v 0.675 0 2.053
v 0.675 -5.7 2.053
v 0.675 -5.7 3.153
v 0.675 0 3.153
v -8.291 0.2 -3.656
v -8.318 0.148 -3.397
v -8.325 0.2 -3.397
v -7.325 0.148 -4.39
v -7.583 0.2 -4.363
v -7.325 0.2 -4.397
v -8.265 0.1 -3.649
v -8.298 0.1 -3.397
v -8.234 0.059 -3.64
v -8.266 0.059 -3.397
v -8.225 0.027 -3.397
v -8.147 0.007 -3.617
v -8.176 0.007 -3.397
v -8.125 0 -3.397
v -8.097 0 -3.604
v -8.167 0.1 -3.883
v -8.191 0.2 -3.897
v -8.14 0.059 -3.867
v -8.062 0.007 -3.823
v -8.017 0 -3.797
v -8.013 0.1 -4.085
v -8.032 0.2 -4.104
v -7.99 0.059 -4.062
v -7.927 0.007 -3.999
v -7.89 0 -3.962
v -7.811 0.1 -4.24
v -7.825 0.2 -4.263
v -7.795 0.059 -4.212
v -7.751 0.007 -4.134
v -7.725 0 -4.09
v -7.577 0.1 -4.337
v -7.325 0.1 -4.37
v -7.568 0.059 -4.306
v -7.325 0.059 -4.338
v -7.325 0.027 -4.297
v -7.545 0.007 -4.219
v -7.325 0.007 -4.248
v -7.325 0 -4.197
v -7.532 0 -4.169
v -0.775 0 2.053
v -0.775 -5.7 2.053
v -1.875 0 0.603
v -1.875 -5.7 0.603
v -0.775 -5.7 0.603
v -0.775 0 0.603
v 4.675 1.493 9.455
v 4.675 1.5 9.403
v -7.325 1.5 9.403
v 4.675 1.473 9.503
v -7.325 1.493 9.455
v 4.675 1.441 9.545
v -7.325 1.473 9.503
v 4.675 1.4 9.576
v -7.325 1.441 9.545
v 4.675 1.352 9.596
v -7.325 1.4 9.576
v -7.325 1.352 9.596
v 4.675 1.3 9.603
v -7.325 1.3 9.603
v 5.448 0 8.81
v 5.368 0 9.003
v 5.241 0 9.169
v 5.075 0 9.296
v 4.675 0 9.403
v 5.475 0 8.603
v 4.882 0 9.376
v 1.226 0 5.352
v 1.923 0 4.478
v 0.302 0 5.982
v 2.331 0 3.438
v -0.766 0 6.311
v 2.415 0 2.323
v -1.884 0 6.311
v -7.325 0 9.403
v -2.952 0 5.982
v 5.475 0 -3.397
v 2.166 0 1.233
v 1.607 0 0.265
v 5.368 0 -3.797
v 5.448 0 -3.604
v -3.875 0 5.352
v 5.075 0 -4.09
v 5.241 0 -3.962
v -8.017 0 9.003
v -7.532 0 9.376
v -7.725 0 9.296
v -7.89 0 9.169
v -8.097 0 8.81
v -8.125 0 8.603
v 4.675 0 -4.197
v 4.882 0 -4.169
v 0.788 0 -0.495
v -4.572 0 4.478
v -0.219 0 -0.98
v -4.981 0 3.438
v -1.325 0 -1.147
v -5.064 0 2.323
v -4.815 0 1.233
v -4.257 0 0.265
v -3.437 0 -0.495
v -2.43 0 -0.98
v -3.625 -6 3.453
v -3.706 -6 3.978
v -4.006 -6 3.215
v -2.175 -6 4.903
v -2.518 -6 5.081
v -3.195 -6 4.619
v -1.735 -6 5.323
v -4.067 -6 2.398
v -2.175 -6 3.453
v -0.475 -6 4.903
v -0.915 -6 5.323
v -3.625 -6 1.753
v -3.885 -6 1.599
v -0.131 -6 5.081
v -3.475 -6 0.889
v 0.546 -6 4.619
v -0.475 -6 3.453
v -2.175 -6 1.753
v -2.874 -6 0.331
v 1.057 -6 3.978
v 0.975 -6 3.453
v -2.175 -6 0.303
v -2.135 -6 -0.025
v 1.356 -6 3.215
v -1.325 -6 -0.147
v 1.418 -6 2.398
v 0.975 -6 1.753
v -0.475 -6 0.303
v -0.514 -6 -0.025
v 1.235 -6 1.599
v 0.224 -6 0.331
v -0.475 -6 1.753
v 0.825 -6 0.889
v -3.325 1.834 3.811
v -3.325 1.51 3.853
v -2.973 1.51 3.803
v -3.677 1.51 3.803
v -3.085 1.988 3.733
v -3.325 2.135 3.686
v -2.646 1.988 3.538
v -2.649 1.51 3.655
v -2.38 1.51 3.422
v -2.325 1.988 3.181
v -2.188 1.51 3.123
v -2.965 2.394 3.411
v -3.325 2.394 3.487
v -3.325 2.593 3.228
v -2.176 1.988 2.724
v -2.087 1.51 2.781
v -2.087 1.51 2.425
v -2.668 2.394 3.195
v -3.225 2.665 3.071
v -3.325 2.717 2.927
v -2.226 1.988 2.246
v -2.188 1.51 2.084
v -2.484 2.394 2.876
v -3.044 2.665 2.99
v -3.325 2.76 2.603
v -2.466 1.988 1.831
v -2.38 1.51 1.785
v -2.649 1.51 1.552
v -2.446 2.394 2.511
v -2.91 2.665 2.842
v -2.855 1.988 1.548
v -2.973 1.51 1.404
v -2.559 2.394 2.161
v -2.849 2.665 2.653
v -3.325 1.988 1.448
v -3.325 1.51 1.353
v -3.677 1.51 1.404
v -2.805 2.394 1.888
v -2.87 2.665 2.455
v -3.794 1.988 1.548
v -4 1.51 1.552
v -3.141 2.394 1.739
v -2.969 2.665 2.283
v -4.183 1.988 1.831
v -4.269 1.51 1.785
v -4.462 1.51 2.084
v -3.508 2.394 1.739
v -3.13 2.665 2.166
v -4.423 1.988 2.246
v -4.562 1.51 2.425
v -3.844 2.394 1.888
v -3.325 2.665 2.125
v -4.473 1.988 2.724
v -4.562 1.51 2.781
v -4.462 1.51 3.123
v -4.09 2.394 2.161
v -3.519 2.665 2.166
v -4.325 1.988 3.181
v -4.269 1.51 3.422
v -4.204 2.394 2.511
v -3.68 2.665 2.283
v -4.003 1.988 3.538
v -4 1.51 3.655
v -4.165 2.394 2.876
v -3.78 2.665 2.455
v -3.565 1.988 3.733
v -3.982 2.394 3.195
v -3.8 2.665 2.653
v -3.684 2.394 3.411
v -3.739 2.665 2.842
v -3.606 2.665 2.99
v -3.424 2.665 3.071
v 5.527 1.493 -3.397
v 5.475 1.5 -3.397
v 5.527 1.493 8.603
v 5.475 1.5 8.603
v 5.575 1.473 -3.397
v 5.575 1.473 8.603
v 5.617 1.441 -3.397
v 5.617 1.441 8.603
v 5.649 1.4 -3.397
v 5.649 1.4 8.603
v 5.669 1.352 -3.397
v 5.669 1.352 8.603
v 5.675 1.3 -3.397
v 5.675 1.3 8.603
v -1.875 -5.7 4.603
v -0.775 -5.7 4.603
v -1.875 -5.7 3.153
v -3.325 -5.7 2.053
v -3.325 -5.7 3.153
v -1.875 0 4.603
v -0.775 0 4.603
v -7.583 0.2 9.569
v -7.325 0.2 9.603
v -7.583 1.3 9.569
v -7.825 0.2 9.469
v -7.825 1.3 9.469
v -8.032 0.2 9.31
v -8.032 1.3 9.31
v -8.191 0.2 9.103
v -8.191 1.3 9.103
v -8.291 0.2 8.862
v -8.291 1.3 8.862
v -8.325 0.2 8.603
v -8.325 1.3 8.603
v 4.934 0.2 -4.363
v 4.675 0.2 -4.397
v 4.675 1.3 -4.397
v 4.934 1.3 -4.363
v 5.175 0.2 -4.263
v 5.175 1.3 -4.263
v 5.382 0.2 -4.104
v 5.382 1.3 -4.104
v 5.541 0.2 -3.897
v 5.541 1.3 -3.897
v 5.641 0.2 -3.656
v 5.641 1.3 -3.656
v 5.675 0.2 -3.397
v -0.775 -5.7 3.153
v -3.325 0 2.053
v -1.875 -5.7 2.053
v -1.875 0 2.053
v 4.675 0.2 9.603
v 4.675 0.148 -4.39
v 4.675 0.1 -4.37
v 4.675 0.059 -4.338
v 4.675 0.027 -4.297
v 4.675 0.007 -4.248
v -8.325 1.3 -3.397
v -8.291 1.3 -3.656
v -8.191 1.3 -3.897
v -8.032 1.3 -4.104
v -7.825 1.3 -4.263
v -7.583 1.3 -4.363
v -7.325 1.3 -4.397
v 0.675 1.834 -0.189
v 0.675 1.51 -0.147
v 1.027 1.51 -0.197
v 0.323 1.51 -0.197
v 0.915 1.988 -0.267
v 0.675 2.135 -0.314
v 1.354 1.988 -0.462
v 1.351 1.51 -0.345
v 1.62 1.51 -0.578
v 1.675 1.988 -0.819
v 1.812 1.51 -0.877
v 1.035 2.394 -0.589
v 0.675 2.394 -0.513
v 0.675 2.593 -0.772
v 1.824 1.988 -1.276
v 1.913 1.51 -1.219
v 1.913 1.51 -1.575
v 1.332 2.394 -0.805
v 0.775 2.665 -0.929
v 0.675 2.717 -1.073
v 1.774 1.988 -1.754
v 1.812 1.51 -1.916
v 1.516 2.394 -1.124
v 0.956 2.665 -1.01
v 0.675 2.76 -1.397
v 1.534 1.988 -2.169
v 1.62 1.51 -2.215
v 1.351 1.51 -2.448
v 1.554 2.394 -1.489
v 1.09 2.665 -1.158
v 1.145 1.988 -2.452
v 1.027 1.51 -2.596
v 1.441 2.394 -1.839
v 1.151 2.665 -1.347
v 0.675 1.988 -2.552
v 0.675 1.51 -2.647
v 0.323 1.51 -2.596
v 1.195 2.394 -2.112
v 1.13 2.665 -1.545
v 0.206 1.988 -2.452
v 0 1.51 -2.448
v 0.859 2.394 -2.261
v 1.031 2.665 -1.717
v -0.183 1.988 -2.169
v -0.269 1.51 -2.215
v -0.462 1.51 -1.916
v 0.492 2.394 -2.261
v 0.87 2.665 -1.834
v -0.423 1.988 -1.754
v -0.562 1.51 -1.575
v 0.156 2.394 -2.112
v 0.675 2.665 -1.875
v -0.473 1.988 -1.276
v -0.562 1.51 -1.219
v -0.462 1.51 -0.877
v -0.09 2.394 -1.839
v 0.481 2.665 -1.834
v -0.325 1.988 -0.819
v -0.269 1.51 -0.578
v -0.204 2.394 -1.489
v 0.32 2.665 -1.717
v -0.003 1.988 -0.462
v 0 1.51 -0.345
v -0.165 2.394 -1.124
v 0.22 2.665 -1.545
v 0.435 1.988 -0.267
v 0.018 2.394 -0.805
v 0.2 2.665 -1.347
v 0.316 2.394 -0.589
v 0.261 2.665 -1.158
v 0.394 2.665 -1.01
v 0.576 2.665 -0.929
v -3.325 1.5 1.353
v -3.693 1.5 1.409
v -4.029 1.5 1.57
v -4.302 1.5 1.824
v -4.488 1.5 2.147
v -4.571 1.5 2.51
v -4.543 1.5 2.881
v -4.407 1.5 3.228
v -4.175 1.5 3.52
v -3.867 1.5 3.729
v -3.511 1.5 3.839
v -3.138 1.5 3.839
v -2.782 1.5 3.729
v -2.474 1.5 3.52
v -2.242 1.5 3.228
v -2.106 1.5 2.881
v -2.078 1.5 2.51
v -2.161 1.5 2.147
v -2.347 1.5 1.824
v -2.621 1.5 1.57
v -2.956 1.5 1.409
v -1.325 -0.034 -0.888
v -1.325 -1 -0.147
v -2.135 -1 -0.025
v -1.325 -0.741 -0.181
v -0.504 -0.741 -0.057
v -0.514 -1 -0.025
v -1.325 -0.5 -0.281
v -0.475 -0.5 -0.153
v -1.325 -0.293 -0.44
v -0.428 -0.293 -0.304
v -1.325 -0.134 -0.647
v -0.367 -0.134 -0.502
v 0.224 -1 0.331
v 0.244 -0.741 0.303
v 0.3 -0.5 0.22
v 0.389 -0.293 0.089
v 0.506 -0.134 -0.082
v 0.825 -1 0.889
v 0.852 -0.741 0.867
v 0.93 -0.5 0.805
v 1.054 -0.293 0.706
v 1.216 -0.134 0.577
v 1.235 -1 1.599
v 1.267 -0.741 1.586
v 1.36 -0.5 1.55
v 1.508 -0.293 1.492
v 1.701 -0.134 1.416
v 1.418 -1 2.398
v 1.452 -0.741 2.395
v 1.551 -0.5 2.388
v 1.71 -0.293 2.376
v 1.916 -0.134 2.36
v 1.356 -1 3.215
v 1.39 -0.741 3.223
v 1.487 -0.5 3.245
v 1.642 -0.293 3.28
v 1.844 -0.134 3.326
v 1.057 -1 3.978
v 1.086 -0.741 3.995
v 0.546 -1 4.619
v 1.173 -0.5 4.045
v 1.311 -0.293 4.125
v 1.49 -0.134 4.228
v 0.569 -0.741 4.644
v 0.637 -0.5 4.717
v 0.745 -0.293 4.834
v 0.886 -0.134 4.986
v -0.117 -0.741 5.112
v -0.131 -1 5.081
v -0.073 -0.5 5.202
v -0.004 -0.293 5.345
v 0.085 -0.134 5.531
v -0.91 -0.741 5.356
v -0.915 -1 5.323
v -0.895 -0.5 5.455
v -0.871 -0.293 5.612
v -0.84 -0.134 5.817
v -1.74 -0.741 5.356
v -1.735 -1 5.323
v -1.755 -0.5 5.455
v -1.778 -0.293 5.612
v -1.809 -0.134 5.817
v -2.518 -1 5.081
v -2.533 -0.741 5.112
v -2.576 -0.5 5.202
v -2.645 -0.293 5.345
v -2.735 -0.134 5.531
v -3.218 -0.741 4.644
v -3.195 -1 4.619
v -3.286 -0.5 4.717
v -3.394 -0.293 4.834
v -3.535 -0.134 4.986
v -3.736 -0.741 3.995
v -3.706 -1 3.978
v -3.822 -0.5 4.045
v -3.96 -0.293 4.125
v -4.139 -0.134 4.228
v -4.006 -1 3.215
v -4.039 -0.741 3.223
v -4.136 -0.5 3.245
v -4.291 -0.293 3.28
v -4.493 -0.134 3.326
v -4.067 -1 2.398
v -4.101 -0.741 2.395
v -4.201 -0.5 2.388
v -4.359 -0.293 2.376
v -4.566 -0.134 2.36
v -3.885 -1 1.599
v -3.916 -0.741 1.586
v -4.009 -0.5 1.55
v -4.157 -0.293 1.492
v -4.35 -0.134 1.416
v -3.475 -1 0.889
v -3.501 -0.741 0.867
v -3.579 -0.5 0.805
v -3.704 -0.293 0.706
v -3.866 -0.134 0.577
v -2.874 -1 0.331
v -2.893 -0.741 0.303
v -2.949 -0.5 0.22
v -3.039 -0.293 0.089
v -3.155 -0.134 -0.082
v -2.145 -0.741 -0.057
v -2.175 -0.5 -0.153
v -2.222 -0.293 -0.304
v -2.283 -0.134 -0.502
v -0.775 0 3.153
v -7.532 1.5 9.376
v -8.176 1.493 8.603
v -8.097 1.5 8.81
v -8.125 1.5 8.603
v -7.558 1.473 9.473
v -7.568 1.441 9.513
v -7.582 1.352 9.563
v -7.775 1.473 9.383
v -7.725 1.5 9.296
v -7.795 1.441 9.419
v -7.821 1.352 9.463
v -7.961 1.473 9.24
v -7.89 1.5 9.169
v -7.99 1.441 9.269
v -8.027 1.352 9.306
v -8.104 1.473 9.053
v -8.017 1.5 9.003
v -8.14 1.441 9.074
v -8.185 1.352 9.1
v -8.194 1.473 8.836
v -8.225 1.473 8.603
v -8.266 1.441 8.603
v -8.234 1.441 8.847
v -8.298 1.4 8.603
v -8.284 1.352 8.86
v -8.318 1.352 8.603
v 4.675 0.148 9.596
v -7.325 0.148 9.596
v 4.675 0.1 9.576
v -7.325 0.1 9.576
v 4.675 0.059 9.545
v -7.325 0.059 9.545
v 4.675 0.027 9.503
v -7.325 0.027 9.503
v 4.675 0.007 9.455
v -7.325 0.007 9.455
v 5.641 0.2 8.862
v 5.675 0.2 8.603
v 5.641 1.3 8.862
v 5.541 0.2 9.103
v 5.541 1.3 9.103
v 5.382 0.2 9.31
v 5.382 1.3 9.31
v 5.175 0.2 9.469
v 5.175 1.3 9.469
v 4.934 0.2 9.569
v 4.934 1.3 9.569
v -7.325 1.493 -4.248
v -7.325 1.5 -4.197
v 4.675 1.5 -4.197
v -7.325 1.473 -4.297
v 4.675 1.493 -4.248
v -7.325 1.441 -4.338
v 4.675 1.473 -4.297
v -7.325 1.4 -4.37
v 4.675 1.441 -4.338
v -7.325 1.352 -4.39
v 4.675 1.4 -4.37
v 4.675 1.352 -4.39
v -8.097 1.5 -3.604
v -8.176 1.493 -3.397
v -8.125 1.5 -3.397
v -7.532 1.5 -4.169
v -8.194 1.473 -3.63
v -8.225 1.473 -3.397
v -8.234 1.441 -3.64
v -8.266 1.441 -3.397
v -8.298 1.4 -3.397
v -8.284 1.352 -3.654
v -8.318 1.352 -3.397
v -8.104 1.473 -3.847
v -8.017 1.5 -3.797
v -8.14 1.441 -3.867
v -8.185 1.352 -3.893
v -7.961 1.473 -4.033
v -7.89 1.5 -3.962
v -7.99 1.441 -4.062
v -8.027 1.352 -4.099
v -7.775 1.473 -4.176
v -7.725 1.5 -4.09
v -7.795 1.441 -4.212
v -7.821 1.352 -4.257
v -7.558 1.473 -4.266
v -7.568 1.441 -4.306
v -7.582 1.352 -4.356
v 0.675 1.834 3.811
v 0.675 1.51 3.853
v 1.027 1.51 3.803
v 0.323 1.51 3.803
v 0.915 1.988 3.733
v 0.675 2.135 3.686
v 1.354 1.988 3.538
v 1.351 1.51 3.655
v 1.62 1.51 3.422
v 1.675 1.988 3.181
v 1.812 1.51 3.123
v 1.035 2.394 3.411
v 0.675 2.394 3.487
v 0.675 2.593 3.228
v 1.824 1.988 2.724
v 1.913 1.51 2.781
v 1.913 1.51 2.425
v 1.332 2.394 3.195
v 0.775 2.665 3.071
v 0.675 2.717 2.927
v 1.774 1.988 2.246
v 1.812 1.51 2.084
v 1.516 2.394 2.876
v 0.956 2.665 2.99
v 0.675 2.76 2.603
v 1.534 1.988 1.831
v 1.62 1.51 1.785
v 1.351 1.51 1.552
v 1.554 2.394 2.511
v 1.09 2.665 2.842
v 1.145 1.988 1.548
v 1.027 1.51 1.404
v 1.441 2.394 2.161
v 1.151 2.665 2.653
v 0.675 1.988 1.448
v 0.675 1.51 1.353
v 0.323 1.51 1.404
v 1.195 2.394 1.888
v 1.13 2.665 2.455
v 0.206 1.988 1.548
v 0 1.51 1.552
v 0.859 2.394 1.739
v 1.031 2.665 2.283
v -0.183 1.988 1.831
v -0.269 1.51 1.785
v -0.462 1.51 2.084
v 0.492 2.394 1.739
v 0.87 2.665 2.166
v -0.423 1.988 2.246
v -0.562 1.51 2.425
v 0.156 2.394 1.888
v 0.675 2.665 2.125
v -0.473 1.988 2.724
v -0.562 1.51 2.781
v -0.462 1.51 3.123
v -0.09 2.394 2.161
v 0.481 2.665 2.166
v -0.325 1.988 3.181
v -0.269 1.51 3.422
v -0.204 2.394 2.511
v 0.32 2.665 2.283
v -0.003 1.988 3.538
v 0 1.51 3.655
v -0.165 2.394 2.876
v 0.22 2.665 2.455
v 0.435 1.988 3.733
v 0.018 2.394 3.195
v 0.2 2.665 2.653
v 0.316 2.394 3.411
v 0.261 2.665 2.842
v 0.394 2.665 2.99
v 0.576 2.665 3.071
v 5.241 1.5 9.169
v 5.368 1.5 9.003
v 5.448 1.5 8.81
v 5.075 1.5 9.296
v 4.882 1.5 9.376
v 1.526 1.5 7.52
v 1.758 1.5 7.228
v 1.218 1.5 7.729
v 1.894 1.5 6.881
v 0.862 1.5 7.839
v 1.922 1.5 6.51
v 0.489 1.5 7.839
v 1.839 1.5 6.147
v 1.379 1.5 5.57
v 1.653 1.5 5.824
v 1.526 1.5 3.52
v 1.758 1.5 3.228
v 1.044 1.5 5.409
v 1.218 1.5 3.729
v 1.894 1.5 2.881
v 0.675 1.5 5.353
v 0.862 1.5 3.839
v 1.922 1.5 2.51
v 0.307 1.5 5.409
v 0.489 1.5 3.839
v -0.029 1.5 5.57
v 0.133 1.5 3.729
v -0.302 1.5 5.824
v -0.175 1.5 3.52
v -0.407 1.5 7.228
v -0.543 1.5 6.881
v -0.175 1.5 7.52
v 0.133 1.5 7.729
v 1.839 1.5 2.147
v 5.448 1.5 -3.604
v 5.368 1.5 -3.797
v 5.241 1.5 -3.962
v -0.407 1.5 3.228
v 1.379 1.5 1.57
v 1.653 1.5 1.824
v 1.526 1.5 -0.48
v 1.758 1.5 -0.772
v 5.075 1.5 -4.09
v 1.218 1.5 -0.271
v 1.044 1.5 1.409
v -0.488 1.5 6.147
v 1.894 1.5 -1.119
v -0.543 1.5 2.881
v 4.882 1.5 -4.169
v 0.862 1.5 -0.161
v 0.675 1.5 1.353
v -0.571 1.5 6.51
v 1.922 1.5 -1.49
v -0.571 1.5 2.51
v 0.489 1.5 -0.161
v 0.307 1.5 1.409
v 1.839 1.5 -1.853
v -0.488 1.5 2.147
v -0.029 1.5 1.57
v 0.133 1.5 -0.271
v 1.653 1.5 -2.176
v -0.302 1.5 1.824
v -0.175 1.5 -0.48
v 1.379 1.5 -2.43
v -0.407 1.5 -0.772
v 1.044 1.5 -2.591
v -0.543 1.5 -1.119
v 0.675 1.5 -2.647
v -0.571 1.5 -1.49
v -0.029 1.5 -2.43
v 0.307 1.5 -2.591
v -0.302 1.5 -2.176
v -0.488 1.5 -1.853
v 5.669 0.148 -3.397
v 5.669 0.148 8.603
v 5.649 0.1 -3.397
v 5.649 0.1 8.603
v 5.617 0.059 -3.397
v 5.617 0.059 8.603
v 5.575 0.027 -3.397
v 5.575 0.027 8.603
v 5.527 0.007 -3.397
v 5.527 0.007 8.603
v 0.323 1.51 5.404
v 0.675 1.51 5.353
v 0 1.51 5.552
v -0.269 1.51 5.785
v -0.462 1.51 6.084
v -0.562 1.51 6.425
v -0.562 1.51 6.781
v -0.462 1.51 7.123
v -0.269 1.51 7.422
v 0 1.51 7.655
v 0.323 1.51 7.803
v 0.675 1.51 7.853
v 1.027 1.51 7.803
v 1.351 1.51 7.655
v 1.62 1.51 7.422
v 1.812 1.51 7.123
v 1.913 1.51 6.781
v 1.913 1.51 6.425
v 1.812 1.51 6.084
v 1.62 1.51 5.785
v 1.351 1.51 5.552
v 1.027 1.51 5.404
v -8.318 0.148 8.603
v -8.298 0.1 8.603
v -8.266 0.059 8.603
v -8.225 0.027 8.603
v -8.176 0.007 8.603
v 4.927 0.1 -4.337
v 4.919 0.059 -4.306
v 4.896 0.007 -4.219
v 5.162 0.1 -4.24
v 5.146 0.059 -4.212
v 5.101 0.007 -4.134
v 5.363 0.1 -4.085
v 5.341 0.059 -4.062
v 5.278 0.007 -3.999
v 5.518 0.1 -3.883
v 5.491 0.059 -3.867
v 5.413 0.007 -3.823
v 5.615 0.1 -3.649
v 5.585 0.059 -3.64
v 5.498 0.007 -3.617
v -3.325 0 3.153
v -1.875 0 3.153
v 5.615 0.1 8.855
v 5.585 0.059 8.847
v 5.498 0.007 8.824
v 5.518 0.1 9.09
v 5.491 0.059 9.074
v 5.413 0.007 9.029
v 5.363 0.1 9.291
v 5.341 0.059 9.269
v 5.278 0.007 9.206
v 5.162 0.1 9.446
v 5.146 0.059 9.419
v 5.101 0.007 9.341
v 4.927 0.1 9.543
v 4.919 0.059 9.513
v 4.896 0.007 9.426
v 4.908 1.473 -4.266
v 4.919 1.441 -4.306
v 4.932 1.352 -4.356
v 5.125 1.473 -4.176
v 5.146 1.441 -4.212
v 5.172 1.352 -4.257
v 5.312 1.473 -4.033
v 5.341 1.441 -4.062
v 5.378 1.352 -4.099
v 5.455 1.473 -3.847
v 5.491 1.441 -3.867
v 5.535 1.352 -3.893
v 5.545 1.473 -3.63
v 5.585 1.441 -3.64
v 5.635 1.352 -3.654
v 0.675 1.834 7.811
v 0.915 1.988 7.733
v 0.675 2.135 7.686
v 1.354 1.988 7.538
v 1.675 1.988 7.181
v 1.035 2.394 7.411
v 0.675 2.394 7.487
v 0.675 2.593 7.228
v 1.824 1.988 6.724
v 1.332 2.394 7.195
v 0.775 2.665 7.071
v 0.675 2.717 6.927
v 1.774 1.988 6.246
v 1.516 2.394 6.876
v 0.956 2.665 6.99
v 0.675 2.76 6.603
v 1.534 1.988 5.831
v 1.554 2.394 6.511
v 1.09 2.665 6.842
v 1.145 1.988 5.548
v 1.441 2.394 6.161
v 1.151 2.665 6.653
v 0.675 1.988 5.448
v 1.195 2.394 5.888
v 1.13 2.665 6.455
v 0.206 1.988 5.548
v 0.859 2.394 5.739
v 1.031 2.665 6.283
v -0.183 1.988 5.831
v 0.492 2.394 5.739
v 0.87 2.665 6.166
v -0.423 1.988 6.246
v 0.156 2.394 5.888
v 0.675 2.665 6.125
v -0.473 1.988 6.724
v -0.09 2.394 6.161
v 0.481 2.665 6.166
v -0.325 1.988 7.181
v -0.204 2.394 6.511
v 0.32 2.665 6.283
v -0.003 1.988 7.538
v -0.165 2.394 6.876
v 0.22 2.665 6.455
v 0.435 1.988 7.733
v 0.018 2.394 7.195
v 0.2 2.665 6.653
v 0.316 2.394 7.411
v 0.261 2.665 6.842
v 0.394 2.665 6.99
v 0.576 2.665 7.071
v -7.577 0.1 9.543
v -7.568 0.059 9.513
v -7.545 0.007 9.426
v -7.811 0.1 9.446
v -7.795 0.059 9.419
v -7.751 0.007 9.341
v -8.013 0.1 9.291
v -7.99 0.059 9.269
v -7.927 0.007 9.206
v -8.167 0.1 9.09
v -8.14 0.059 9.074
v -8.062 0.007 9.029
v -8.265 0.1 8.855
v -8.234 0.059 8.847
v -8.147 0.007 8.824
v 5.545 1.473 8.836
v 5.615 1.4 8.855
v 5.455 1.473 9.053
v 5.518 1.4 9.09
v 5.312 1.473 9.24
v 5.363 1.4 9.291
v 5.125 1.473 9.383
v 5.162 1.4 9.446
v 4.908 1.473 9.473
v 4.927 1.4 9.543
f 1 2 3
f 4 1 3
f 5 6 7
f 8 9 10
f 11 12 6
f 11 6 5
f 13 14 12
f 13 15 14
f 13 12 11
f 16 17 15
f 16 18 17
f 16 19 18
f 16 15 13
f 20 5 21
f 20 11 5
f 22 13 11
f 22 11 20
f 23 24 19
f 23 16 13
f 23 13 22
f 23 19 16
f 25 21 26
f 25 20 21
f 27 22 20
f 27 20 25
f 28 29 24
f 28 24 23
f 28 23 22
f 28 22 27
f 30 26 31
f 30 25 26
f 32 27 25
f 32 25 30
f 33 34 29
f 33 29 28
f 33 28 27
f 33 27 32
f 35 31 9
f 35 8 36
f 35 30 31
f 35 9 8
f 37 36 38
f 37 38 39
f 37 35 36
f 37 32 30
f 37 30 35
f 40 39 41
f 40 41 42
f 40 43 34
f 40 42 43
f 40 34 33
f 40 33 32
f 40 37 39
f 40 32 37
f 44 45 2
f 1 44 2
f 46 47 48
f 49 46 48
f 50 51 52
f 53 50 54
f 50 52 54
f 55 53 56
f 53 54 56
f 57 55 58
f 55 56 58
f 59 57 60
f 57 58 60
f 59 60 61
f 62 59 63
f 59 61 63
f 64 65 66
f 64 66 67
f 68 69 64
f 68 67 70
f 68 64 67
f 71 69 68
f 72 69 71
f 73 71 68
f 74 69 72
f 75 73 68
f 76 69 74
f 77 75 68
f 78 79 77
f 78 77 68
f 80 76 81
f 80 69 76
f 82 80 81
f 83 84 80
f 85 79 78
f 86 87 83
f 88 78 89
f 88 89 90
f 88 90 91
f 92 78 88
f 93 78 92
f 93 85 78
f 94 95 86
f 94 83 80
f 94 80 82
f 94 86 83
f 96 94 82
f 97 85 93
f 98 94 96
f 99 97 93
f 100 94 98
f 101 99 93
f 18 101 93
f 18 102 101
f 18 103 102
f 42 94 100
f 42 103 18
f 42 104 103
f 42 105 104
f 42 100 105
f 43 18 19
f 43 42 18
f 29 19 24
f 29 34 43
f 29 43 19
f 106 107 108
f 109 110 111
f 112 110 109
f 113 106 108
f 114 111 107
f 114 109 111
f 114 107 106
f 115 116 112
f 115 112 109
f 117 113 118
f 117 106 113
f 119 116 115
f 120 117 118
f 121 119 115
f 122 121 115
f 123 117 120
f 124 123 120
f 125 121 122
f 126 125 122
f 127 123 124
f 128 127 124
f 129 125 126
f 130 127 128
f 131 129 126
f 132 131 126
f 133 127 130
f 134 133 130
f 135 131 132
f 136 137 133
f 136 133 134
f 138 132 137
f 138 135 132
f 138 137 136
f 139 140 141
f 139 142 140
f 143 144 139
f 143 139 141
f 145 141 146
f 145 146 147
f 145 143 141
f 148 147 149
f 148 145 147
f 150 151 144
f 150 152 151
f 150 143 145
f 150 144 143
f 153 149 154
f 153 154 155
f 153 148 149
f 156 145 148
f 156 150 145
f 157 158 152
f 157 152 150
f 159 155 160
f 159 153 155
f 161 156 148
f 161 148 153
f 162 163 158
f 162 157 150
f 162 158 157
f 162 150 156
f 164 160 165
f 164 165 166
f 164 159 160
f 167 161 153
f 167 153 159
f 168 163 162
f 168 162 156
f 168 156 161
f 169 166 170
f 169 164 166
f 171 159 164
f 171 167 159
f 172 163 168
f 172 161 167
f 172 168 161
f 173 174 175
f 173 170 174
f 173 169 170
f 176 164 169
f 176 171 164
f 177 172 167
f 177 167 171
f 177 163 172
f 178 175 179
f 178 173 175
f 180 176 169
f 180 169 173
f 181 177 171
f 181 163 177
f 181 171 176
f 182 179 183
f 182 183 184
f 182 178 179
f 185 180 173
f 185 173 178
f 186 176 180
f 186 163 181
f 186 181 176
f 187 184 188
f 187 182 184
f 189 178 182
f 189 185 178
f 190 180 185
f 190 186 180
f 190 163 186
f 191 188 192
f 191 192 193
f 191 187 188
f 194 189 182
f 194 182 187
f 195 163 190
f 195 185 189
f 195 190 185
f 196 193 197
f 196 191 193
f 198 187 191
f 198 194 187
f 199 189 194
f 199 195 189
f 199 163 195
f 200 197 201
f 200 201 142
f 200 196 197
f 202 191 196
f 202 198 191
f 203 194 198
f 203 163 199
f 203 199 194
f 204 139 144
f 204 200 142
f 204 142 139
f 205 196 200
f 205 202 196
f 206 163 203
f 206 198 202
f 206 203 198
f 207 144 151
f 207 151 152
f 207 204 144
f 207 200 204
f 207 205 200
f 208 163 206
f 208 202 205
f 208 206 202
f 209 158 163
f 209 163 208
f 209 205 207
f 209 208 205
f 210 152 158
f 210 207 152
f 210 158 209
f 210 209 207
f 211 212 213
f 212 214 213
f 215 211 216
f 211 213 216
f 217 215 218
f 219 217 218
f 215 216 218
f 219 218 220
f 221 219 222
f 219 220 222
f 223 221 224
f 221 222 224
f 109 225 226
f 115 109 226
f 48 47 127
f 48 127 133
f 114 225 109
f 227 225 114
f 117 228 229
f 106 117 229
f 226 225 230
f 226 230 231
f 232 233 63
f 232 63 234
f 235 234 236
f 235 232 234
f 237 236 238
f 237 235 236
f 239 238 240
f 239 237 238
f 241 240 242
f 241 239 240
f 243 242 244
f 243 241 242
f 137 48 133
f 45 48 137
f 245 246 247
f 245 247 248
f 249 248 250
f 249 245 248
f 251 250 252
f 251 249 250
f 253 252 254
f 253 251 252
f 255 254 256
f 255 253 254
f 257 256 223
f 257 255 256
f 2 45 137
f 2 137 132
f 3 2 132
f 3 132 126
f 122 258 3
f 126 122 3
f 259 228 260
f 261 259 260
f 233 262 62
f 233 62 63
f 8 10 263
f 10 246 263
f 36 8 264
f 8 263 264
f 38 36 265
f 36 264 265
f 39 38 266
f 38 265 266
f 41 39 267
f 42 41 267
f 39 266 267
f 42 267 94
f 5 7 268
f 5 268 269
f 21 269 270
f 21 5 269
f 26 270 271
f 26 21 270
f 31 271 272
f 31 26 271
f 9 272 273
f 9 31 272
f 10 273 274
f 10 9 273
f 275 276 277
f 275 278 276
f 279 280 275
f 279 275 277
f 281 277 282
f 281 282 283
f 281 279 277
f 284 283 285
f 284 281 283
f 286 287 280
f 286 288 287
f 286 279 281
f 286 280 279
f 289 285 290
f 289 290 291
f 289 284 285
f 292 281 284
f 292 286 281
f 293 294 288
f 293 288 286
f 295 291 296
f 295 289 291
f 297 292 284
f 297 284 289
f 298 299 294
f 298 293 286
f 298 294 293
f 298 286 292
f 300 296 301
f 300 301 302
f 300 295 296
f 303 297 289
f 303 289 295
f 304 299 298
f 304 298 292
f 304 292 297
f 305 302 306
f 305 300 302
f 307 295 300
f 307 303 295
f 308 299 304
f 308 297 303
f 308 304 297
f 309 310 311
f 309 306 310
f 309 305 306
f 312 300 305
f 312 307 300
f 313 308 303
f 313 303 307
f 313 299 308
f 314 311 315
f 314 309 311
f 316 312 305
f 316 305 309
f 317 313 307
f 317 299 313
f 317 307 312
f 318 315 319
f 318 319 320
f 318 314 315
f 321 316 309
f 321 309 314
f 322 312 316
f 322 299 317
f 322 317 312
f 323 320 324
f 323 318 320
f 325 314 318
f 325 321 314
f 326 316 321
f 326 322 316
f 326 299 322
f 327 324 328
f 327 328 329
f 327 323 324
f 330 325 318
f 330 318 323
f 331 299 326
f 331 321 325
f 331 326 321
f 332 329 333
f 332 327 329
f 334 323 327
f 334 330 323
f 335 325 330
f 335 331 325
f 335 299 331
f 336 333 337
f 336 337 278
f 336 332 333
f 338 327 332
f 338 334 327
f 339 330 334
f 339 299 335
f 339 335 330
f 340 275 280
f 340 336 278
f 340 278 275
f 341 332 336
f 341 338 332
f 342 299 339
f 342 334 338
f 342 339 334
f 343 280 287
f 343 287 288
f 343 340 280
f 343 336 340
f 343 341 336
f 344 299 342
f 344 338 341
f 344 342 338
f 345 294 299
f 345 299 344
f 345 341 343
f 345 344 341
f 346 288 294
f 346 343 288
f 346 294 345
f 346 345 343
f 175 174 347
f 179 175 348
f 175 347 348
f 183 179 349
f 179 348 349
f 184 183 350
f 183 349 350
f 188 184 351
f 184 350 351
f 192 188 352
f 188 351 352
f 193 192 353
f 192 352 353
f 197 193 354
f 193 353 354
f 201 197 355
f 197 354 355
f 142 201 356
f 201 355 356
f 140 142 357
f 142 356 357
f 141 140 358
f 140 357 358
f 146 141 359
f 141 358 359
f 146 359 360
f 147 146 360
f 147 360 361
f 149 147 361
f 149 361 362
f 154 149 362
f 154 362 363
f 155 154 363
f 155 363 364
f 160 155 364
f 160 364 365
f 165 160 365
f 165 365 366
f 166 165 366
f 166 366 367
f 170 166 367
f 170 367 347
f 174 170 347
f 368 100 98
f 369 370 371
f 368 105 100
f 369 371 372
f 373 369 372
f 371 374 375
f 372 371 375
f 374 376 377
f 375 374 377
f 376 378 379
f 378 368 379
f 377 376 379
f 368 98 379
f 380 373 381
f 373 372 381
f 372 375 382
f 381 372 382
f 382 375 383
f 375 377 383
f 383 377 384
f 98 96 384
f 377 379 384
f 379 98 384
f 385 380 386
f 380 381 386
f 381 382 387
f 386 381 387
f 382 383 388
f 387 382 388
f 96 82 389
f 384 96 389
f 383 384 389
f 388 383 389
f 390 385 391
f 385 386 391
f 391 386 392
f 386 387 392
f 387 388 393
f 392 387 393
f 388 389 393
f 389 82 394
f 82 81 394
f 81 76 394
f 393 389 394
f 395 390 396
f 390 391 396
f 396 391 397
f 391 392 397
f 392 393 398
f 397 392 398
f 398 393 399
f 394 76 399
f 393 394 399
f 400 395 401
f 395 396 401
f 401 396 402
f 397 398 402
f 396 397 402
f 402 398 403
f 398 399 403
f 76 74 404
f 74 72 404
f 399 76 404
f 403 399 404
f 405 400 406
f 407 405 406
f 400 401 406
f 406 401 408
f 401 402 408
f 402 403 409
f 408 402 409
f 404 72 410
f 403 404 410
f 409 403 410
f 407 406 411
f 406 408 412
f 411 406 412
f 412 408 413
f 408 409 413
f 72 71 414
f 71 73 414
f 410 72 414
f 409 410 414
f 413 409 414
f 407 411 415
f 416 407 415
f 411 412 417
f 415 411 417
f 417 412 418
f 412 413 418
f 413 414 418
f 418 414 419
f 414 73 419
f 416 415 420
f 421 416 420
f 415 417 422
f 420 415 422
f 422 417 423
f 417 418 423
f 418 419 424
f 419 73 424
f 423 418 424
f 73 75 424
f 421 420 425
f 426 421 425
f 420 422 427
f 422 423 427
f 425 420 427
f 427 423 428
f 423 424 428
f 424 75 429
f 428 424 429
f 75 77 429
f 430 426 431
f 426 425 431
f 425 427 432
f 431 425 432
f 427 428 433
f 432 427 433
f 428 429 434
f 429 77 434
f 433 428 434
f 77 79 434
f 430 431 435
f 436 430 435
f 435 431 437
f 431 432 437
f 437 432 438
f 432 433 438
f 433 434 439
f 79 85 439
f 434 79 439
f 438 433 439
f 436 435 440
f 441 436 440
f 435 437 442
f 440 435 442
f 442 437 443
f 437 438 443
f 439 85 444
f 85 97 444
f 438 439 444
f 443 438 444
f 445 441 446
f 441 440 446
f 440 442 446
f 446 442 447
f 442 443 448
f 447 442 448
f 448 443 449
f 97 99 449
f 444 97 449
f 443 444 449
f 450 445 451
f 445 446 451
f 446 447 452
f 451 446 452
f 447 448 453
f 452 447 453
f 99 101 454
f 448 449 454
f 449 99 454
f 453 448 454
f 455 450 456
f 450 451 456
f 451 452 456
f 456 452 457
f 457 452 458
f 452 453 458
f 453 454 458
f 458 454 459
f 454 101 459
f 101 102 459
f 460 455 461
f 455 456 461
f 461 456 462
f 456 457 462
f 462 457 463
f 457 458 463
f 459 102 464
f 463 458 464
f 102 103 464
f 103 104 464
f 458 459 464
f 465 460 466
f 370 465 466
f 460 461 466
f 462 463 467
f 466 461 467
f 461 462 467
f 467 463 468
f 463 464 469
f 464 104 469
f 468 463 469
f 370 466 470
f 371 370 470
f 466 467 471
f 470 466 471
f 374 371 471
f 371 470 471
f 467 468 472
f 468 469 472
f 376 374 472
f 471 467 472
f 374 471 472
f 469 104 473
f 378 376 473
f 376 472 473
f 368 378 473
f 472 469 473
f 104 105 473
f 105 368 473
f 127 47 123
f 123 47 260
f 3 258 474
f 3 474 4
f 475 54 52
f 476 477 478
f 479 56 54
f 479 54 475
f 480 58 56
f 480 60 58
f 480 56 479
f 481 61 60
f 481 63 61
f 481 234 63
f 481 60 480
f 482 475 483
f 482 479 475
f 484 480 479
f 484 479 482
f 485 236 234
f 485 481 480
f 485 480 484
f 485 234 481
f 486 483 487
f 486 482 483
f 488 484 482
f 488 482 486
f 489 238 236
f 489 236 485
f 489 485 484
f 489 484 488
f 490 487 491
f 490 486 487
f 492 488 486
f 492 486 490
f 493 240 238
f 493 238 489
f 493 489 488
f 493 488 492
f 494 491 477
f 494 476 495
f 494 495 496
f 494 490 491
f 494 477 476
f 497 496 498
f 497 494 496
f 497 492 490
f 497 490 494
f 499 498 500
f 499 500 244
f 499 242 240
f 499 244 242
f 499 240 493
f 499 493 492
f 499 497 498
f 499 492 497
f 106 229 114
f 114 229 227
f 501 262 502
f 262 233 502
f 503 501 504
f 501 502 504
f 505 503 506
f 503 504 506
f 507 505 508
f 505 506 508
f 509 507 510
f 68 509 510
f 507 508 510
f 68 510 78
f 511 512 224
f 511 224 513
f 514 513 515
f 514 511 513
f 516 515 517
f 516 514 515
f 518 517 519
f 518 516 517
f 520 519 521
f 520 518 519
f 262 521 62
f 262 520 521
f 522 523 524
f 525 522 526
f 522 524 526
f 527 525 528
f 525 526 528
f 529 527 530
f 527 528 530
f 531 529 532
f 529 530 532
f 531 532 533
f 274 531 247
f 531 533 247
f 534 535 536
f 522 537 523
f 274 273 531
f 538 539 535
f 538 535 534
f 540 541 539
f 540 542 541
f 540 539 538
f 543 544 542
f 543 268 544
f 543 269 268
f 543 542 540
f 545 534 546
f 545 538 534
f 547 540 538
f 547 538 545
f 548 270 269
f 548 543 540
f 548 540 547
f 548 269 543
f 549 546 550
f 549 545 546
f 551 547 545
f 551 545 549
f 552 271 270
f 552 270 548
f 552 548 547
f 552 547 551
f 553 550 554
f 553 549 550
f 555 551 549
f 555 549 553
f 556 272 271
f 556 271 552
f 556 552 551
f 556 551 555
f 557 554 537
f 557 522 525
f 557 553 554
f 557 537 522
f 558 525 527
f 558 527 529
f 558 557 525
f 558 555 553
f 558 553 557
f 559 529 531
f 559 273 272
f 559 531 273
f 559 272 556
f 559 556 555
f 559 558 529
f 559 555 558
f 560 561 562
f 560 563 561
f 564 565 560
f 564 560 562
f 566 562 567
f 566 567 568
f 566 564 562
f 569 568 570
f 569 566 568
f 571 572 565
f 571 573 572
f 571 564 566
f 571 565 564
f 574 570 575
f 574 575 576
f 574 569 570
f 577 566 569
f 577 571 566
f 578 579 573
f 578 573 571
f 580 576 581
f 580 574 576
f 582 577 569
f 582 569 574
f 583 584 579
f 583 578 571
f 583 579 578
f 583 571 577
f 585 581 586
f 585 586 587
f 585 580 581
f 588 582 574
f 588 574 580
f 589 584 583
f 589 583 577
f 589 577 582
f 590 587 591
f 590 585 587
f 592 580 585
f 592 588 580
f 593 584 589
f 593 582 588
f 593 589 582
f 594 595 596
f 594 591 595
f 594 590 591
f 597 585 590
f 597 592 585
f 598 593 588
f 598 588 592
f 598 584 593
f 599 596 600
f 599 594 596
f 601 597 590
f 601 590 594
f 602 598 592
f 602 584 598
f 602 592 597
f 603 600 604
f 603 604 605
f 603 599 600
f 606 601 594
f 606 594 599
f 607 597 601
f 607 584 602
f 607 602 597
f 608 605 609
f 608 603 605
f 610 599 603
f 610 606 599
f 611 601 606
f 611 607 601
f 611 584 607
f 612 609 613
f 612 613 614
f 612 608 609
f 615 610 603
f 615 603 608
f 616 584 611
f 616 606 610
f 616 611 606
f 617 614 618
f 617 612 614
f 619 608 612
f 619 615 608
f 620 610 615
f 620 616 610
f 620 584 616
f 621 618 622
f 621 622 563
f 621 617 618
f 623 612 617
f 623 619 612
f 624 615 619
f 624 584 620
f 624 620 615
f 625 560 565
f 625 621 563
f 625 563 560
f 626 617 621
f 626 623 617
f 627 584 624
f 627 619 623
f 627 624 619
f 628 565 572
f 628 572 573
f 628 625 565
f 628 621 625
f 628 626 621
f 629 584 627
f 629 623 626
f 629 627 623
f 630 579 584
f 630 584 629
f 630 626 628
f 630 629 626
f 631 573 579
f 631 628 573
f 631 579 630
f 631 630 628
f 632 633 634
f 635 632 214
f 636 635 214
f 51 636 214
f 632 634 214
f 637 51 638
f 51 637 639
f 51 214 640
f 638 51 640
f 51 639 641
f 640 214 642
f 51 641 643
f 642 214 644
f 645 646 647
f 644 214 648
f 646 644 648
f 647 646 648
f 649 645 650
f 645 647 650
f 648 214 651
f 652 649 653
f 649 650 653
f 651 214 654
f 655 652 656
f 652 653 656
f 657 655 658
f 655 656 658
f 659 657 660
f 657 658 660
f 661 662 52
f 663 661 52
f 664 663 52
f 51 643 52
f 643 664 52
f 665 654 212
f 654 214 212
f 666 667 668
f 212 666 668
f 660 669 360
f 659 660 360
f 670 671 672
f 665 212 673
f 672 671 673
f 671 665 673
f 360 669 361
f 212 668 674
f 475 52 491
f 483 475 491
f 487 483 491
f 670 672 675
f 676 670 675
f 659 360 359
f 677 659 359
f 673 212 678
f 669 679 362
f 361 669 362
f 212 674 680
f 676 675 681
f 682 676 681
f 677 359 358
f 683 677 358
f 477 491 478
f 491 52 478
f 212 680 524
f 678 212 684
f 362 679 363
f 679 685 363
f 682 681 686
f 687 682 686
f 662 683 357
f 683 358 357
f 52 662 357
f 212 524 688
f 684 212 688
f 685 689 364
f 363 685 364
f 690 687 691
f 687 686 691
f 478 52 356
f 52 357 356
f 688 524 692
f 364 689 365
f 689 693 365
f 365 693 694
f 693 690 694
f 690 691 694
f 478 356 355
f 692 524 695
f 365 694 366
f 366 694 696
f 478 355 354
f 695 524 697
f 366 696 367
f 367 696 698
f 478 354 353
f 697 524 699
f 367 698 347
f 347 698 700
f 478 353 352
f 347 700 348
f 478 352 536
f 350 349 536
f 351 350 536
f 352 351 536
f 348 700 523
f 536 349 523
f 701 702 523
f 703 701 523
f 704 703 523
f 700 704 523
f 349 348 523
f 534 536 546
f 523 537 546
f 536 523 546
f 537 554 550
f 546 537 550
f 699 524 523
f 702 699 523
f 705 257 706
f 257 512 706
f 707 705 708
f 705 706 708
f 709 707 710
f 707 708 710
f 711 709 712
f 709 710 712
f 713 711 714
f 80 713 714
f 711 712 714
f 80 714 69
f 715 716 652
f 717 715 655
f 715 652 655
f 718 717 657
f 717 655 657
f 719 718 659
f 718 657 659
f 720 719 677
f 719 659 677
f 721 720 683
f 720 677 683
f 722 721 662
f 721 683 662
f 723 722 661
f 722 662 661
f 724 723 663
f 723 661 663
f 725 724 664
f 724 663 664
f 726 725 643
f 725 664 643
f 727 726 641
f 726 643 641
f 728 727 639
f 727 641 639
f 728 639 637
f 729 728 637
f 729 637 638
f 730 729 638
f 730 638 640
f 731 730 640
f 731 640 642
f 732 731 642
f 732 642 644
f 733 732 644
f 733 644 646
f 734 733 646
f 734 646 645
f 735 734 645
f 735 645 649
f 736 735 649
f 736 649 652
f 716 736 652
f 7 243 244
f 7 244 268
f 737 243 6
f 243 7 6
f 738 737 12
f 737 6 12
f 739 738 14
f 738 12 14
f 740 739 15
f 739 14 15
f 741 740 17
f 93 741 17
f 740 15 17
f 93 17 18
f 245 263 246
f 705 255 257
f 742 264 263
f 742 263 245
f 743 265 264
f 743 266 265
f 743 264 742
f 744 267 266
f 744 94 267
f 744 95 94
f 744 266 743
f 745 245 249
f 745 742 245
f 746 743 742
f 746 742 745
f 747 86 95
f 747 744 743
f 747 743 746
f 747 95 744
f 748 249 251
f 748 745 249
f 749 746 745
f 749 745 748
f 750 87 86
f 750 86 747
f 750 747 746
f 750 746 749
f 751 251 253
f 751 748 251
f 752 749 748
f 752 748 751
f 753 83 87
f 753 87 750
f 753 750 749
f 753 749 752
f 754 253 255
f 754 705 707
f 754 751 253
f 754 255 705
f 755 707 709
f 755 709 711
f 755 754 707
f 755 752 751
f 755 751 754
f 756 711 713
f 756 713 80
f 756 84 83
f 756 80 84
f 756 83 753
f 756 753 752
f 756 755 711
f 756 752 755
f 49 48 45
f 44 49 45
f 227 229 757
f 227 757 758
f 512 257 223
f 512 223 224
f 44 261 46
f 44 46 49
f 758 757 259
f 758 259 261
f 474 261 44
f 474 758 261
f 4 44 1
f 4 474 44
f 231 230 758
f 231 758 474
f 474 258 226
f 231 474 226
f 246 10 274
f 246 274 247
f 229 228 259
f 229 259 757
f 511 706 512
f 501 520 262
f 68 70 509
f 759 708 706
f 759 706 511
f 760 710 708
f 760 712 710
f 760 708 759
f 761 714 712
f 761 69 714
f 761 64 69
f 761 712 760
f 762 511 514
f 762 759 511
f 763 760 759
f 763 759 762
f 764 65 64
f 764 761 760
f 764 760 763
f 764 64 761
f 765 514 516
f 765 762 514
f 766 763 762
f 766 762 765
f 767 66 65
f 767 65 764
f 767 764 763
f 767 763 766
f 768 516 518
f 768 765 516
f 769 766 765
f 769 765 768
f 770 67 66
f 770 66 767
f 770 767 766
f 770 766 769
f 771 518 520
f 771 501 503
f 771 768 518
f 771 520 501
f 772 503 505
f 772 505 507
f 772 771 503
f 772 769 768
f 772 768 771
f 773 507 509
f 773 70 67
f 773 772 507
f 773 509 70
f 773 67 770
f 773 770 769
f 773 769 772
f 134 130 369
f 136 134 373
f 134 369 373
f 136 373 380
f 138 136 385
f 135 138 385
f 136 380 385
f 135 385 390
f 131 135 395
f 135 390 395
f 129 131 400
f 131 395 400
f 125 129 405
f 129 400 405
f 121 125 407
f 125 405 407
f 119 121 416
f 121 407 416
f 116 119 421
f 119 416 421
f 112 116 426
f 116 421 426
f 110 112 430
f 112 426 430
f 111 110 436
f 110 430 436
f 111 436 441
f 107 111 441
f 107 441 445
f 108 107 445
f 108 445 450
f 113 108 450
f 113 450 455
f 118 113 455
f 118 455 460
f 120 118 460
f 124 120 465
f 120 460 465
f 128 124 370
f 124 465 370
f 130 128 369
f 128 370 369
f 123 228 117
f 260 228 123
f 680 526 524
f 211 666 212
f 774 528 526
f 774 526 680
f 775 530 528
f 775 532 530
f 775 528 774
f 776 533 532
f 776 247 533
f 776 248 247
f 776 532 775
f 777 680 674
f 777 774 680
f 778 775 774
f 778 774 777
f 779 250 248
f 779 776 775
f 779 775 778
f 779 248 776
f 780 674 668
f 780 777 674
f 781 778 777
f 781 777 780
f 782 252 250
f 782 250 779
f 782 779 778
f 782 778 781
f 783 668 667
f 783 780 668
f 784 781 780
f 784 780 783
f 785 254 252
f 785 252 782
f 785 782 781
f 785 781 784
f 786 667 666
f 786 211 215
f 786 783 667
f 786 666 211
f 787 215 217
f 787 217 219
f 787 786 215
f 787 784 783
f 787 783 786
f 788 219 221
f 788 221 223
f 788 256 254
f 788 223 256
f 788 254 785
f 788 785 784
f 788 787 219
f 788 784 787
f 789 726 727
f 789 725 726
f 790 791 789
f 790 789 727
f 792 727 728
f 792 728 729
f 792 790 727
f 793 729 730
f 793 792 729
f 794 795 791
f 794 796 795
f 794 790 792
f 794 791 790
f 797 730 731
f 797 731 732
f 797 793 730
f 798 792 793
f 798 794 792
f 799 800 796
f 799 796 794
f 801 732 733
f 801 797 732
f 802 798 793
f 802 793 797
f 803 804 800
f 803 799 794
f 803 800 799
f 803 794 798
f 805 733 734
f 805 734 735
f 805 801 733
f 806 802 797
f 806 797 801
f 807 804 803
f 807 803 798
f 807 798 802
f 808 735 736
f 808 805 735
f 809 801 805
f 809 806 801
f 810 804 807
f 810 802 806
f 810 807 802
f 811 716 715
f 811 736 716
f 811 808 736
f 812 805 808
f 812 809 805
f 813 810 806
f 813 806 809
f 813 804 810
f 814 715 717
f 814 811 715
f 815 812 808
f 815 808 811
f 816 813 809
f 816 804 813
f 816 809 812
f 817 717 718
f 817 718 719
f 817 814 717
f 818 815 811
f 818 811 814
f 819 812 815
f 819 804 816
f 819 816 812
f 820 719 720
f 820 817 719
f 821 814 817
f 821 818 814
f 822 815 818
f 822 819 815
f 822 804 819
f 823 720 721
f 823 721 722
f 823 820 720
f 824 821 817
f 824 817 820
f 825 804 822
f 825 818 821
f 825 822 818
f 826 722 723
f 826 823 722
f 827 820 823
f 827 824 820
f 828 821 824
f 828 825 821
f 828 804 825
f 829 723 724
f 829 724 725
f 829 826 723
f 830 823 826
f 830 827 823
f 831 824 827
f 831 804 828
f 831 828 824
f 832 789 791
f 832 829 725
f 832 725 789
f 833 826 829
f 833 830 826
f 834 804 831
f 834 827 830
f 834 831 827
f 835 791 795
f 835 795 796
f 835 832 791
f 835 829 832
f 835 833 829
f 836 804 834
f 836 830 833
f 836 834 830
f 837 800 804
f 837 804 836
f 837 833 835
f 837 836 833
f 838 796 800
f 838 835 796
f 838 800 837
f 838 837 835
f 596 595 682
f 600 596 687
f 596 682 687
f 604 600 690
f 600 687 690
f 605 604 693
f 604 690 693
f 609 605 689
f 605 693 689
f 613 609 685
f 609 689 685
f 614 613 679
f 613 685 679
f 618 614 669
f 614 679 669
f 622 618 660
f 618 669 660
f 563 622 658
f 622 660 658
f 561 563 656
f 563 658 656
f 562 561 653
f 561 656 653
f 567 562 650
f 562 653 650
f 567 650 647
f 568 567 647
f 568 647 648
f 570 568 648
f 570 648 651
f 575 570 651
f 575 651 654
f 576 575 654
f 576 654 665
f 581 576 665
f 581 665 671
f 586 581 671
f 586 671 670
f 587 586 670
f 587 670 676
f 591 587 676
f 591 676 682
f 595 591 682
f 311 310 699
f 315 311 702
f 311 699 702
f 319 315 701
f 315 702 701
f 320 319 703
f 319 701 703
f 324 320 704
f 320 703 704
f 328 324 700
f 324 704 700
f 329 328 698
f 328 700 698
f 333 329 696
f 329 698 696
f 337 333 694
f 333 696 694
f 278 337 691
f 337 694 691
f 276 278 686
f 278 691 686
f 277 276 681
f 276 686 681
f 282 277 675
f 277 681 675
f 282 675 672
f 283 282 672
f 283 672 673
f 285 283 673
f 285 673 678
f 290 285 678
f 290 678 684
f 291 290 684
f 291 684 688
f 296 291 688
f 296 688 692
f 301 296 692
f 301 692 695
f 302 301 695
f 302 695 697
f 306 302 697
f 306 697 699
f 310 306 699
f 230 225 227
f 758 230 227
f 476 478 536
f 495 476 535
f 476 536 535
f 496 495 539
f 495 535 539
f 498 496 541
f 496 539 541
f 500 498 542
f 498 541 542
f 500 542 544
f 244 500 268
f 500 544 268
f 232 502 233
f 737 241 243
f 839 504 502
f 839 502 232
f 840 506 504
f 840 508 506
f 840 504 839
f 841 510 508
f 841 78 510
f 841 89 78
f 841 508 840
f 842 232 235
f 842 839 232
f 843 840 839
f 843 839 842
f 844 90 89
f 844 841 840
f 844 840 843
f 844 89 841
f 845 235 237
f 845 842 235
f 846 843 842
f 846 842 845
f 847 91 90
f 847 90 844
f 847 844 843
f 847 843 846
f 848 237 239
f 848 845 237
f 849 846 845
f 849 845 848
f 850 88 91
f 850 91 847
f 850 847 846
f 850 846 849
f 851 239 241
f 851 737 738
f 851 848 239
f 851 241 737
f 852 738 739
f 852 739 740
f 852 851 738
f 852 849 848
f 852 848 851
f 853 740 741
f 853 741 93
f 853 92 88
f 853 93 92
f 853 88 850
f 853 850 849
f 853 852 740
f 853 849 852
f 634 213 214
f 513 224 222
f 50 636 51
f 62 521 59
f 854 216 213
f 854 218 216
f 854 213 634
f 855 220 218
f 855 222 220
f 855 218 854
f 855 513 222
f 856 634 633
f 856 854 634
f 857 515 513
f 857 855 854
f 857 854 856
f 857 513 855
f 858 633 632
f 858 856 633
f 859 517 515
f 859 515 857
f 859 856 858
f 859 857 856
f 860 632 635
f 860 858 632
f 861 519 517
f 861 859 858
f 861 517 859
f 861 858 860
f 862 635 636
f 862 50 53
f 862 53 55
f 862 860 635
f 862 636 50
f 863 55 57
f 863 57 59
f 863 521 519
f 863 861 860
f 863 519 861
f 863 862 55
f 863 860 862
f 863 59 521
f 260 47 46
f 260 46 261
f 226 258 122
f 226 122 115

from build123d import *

# Parameters (mm, degrees)
BOSS_EXTRUDE1_DEPTH = 1.5
SKETCH2_R           = 2.75
BOSS_EXTRUDE2_DEPTH = 6
SKETCH3_W           = 1.1
SKETCH3_H           = 1.45
SKETCH3_W_2         = 1.45
SKETCH3_H_2         = 1.1
CUT_EXTRUDE1_DEPTH  = 6
CHAMFER1_SIZE       = 0.3
FILLET1_R           = 1
SKETCH4_R           = 1.25
BOSS_EXTRUDE3_DEPTH = 0.01
DOME2_FACE_RADIUS   = 1.25
DOME2_HEIGHT        = 1.25
DOME3_FACE_RADIUS   = 1.25
DOME3_HEIGHT        = 1.25
DOME4_FACE_RADIUS   = 1.25
DOME4_HEIGHT        = 1.25
DOME6_FACE_RADIUS   = 1.25
DOME6_HEIGHT        = 1.25
FILLET3_R           = 0.2


with BuildPart() as part:
    # Sketch1 → Boss-Extrude1 (new body)
    with BuildSketch(Plane(origin=(0, 0, 0), x_dir=(1, 0, 0), z_dir=(0, 1, 0))):
        with BuildLine():
            Line((-7.324675649, 4.396717546), (4.675324351, 4.396717546))
            ThreePointArc((4.675324351, 4.396717546), (5.382431132, 4.103824327), (5.675324351, 3.396717546))
            Line((5.675324351, 3.396717546), (5.675324351, -8.603282454))
            ThreePointArc((5.675324351, -8.603282454), (5.382431132, -9.310389235), (4.675324351, -9.603282454))
            Line((4.675324351, -9.603282454), (-7.324675649, -9.603282454))
            ThreePointArc((-7.324675649, -9.603282454), (-8.03178243, -9.310389235), (-8.324675649, -8.603282454))
            Line((-8.324675649, -8.603282454), (-8.324675649, 3.396717546))
            ThreePointArc((-8.324675649, 3.396717546), (-8.03178243, 4.103824327), (-7.324675649, 4.396717546))
        make_face()
    extrude(amount=BOSS_EXTRUDE1_DEPTH)

    # Sketch2 → Boss-Extrude2 (add)
    with BuildSketch(Plane.XZ):
        with Locations(Location((-1.324675649, 2.603282454, 0), (0, 0, 270))):
            Circle(SKETCH2_R)
    extrude(amount=BOSS_EXTRUDE2_DEPTH)

    # Sketch3 → Cut-Extrude1 (cut)
    with BuildSketch(Plane.XZ.offset(6)):
        with Locations((-1.324675649, 3.878282454)):
            Rectangle(SKETCH3_W, SKETCH3_H)
        with Locations((-0.049675649, 2.603282454)):
            Rectangle(SKETCH3_W_2, SKETCH3_H_2)
        with Locations((-1.324675649, 2.603282454)):
            Rectangle(SKETCH3_W, SKETCH3_H_2)
        with Locations((-2.599675649, 2.603282454)):
            Rectangle(SKETCH3_W_2, SKETCH3_H_2)
        with Locations((-1.324675649, 1.328282454)):
            Rectangle(SKETCH3_W, SKETCH3_H)
    extrude(amount=-CUT_EXTRUDE1_DEPTH, mode=Mode.SUBTRACT)

    # Chamfer1
    chamfer1_edges = [part.edges().sort_by_distance(p)[0] for p in [
        (-0.774675649, -6, 3.878282454),
        (-0.049675649, -6, 3.153282454),
        (0.675324351, -6, 2.603282454),
        (-0.774675649, -6, 1.328282454),
        (-2.599675649, -6, 3.153282454),
        (-1.324675649, -6, 4.603282454),
        (-1.874675649, -6, 3.878282454),
        (-3.324675649, -6, 2.603282454),
        (-2.599675649, -6, 2.053282454),
        (-1.874675649, -6, 1.328282454),
        (-1.324675649, -6, 0.603282454),
        (-0.049675649, -6, 2.053282454),
    ]]
    chamfer(chamfer1_edges, length=CHAMFER1_SIZE)

    # Fillet1
    fillet1_edges = [part.edges().sort_by_distance(p)[0] for p in [
        (-1.324675649, 0, 5.353282454),
    ]]
    fillet(fillet1_edges, radius=FILLET1_R)

    # Sketch4 → Boss-Extrude3 (add)
    with BuildSketch(Plane(origin=(0, 1.5, 0), x_dir=(1, 0, 0), z_dir=(0, 1, 0))):
        with Locations(Location((0.675324351, -2.603282454, 0), (0, 0, 90))):
            Circle(SKETCH4_R)
        with Locations(Location((-3.324675649, -2.603282454, 0), (0, 0, 90))):
            Circle(SKETCH4_R)
        with Locations(Location((0.675324351, -6.603282454, 0), (0, 0, 90))):
            Circle(SKETCH4_R)
        with Locations(Location((0.675324351, 1.396717546, 0), (0, 0, 90))):
            Circle(SKETCH4_R)
    extrude(amount=BOSS_EXTRUDE3_DEPTH)

    # Dome2: a dome of height H over a round flat face of radius A is a cap of a sphere of radius (A * A + H * H) / (2 * H)
    dome2_r = (DOME2_FACE_RADIUS * DOME2_FACE_RADIUS + DOME2_HEIGHT * DOME2_HEIGHT) / (2 * DOME2_HEIGHT)
    dome2_base = Plane((0.675324351, 1.51, -1.396717546), z_dir=(0, 1, 0))
    with Locations(dome2_base.offset(DOME2_HEIGHT - dome2_r)):
        dome2_ball = Sphere(dome2_r, mode=Mode.PRIVATE)
    add(split(dome2_ball, bisect_by=dome2_base, keep=Keep.TOP, mode=Mode.PRIVATE))

    # Dome3: a dome of height H over a round flat face of radius A is a cap of a sphere of radius (A * A + H * H) / (2 * H)
    dome3_r = (DOME3_FACE_RADIUS * DOME3_FACE_RADIUS + DOME3_HEIGHT * DOME3_HEIGHT) / (2 * DOME3_HEIGHT)
    dome3_base = Plane((-3.324675649, 1.51, 2.603282454), z_dir=(0, 1, 0))
    with Locations(dome3_base.offset(DOME3_HEIGHT - dome3_r)):
        dome3_ball = Sphere(dome3_r, mode=Mode.PRIVATE)
    add(split(dome3_ball, bisect_by=dome3_base, keep=Keep.TOP, mode=Mode.PRIVATE))

    # Dome4: a dome of height H over a round flat face of radius A is a cap of a sphere of radius (A * A + H * H) / (2 * H)
    dome4_r = (DOME4_FACE_RADIUS * DOME4_FACE_RADIUS + DOME4_HEIGHT * DOME4_HEIGHT) / (2 * DOME4_HEIGHT)
    dome4_base = Plane((0.675324351, 1.51, 2.603282454), z_dir=(0, 1, 0))
    with Locations(dome4_base.offset(DOME4_HEIGHT - dome4_r)):
        dome4_ball = Sphere(dome4_r, mode=Mode.PRIVATE)
    add(split(dome4_ball, bisect_by=dome4_base, keep=Keep.TOP, mode=Mode.PRIVATE))

    # Dome6: a dome of height H over a round flat face of radius A is a cap of a sphere of radius (A * A + H * H) / (2 * H)
    dome6_r = (DOME6_FACE_RADIUS * DOME6_FACE_RADIUS + DOME6_HEIGHT * DOME6_HEIGHT) / (2 * DOME6_HEIGHT)
    dome6_base = Plane((0.675324351, 1.51, 6.603282454), z_dir=(0, 1, 0))
    with Locations(dome6_base.offset(DOME6_HEIGHT - dome6_r)):
        dome6_ball = Sphere(dome6_r, mode=Mode.PRIVATE)
    add(split(dome6_ball, bisect_by=dome6_base, keep=Keep.TOP, mode=Mode.PRIVATE))

    # Fillet3
    fillet3_edges = [part.edges().sort_by_distance(p)[0] for p in [
        (5.382431132, 1.5, 9.310389235),
        (-1.324675649, 0, 9.603282454),
        (-8.03178243, 0, 9.310389235),
        (5.675324351, 1.5, 2.603282454),
        (5.382431132, 1.5, -4.103824327),
        (-1.324675649, 1.5, -4.396717546),
        (-8.03178243, 1.5, -4.103824327),
        (-8.324675649, 1.5, 2.603282454),
        (-8.03178243, 1.5, 9.310389235),
        (-1.324675649, 1.5, 9.603282454),
        (-8.324675649, 0, 2.603282454),
        (-8.03178243, 0, -4.103824327),
        (-1.324675649, 0, -4.396717546),
        (5.382431132, 0, -4.103824327),
        (5.675324351, 0, 2.603282454),
        (5.382431132, 0, 9.310389235),
    ]]
    fillet(fillet3_edges, radius=FILLET3_R)


solid = part.part
